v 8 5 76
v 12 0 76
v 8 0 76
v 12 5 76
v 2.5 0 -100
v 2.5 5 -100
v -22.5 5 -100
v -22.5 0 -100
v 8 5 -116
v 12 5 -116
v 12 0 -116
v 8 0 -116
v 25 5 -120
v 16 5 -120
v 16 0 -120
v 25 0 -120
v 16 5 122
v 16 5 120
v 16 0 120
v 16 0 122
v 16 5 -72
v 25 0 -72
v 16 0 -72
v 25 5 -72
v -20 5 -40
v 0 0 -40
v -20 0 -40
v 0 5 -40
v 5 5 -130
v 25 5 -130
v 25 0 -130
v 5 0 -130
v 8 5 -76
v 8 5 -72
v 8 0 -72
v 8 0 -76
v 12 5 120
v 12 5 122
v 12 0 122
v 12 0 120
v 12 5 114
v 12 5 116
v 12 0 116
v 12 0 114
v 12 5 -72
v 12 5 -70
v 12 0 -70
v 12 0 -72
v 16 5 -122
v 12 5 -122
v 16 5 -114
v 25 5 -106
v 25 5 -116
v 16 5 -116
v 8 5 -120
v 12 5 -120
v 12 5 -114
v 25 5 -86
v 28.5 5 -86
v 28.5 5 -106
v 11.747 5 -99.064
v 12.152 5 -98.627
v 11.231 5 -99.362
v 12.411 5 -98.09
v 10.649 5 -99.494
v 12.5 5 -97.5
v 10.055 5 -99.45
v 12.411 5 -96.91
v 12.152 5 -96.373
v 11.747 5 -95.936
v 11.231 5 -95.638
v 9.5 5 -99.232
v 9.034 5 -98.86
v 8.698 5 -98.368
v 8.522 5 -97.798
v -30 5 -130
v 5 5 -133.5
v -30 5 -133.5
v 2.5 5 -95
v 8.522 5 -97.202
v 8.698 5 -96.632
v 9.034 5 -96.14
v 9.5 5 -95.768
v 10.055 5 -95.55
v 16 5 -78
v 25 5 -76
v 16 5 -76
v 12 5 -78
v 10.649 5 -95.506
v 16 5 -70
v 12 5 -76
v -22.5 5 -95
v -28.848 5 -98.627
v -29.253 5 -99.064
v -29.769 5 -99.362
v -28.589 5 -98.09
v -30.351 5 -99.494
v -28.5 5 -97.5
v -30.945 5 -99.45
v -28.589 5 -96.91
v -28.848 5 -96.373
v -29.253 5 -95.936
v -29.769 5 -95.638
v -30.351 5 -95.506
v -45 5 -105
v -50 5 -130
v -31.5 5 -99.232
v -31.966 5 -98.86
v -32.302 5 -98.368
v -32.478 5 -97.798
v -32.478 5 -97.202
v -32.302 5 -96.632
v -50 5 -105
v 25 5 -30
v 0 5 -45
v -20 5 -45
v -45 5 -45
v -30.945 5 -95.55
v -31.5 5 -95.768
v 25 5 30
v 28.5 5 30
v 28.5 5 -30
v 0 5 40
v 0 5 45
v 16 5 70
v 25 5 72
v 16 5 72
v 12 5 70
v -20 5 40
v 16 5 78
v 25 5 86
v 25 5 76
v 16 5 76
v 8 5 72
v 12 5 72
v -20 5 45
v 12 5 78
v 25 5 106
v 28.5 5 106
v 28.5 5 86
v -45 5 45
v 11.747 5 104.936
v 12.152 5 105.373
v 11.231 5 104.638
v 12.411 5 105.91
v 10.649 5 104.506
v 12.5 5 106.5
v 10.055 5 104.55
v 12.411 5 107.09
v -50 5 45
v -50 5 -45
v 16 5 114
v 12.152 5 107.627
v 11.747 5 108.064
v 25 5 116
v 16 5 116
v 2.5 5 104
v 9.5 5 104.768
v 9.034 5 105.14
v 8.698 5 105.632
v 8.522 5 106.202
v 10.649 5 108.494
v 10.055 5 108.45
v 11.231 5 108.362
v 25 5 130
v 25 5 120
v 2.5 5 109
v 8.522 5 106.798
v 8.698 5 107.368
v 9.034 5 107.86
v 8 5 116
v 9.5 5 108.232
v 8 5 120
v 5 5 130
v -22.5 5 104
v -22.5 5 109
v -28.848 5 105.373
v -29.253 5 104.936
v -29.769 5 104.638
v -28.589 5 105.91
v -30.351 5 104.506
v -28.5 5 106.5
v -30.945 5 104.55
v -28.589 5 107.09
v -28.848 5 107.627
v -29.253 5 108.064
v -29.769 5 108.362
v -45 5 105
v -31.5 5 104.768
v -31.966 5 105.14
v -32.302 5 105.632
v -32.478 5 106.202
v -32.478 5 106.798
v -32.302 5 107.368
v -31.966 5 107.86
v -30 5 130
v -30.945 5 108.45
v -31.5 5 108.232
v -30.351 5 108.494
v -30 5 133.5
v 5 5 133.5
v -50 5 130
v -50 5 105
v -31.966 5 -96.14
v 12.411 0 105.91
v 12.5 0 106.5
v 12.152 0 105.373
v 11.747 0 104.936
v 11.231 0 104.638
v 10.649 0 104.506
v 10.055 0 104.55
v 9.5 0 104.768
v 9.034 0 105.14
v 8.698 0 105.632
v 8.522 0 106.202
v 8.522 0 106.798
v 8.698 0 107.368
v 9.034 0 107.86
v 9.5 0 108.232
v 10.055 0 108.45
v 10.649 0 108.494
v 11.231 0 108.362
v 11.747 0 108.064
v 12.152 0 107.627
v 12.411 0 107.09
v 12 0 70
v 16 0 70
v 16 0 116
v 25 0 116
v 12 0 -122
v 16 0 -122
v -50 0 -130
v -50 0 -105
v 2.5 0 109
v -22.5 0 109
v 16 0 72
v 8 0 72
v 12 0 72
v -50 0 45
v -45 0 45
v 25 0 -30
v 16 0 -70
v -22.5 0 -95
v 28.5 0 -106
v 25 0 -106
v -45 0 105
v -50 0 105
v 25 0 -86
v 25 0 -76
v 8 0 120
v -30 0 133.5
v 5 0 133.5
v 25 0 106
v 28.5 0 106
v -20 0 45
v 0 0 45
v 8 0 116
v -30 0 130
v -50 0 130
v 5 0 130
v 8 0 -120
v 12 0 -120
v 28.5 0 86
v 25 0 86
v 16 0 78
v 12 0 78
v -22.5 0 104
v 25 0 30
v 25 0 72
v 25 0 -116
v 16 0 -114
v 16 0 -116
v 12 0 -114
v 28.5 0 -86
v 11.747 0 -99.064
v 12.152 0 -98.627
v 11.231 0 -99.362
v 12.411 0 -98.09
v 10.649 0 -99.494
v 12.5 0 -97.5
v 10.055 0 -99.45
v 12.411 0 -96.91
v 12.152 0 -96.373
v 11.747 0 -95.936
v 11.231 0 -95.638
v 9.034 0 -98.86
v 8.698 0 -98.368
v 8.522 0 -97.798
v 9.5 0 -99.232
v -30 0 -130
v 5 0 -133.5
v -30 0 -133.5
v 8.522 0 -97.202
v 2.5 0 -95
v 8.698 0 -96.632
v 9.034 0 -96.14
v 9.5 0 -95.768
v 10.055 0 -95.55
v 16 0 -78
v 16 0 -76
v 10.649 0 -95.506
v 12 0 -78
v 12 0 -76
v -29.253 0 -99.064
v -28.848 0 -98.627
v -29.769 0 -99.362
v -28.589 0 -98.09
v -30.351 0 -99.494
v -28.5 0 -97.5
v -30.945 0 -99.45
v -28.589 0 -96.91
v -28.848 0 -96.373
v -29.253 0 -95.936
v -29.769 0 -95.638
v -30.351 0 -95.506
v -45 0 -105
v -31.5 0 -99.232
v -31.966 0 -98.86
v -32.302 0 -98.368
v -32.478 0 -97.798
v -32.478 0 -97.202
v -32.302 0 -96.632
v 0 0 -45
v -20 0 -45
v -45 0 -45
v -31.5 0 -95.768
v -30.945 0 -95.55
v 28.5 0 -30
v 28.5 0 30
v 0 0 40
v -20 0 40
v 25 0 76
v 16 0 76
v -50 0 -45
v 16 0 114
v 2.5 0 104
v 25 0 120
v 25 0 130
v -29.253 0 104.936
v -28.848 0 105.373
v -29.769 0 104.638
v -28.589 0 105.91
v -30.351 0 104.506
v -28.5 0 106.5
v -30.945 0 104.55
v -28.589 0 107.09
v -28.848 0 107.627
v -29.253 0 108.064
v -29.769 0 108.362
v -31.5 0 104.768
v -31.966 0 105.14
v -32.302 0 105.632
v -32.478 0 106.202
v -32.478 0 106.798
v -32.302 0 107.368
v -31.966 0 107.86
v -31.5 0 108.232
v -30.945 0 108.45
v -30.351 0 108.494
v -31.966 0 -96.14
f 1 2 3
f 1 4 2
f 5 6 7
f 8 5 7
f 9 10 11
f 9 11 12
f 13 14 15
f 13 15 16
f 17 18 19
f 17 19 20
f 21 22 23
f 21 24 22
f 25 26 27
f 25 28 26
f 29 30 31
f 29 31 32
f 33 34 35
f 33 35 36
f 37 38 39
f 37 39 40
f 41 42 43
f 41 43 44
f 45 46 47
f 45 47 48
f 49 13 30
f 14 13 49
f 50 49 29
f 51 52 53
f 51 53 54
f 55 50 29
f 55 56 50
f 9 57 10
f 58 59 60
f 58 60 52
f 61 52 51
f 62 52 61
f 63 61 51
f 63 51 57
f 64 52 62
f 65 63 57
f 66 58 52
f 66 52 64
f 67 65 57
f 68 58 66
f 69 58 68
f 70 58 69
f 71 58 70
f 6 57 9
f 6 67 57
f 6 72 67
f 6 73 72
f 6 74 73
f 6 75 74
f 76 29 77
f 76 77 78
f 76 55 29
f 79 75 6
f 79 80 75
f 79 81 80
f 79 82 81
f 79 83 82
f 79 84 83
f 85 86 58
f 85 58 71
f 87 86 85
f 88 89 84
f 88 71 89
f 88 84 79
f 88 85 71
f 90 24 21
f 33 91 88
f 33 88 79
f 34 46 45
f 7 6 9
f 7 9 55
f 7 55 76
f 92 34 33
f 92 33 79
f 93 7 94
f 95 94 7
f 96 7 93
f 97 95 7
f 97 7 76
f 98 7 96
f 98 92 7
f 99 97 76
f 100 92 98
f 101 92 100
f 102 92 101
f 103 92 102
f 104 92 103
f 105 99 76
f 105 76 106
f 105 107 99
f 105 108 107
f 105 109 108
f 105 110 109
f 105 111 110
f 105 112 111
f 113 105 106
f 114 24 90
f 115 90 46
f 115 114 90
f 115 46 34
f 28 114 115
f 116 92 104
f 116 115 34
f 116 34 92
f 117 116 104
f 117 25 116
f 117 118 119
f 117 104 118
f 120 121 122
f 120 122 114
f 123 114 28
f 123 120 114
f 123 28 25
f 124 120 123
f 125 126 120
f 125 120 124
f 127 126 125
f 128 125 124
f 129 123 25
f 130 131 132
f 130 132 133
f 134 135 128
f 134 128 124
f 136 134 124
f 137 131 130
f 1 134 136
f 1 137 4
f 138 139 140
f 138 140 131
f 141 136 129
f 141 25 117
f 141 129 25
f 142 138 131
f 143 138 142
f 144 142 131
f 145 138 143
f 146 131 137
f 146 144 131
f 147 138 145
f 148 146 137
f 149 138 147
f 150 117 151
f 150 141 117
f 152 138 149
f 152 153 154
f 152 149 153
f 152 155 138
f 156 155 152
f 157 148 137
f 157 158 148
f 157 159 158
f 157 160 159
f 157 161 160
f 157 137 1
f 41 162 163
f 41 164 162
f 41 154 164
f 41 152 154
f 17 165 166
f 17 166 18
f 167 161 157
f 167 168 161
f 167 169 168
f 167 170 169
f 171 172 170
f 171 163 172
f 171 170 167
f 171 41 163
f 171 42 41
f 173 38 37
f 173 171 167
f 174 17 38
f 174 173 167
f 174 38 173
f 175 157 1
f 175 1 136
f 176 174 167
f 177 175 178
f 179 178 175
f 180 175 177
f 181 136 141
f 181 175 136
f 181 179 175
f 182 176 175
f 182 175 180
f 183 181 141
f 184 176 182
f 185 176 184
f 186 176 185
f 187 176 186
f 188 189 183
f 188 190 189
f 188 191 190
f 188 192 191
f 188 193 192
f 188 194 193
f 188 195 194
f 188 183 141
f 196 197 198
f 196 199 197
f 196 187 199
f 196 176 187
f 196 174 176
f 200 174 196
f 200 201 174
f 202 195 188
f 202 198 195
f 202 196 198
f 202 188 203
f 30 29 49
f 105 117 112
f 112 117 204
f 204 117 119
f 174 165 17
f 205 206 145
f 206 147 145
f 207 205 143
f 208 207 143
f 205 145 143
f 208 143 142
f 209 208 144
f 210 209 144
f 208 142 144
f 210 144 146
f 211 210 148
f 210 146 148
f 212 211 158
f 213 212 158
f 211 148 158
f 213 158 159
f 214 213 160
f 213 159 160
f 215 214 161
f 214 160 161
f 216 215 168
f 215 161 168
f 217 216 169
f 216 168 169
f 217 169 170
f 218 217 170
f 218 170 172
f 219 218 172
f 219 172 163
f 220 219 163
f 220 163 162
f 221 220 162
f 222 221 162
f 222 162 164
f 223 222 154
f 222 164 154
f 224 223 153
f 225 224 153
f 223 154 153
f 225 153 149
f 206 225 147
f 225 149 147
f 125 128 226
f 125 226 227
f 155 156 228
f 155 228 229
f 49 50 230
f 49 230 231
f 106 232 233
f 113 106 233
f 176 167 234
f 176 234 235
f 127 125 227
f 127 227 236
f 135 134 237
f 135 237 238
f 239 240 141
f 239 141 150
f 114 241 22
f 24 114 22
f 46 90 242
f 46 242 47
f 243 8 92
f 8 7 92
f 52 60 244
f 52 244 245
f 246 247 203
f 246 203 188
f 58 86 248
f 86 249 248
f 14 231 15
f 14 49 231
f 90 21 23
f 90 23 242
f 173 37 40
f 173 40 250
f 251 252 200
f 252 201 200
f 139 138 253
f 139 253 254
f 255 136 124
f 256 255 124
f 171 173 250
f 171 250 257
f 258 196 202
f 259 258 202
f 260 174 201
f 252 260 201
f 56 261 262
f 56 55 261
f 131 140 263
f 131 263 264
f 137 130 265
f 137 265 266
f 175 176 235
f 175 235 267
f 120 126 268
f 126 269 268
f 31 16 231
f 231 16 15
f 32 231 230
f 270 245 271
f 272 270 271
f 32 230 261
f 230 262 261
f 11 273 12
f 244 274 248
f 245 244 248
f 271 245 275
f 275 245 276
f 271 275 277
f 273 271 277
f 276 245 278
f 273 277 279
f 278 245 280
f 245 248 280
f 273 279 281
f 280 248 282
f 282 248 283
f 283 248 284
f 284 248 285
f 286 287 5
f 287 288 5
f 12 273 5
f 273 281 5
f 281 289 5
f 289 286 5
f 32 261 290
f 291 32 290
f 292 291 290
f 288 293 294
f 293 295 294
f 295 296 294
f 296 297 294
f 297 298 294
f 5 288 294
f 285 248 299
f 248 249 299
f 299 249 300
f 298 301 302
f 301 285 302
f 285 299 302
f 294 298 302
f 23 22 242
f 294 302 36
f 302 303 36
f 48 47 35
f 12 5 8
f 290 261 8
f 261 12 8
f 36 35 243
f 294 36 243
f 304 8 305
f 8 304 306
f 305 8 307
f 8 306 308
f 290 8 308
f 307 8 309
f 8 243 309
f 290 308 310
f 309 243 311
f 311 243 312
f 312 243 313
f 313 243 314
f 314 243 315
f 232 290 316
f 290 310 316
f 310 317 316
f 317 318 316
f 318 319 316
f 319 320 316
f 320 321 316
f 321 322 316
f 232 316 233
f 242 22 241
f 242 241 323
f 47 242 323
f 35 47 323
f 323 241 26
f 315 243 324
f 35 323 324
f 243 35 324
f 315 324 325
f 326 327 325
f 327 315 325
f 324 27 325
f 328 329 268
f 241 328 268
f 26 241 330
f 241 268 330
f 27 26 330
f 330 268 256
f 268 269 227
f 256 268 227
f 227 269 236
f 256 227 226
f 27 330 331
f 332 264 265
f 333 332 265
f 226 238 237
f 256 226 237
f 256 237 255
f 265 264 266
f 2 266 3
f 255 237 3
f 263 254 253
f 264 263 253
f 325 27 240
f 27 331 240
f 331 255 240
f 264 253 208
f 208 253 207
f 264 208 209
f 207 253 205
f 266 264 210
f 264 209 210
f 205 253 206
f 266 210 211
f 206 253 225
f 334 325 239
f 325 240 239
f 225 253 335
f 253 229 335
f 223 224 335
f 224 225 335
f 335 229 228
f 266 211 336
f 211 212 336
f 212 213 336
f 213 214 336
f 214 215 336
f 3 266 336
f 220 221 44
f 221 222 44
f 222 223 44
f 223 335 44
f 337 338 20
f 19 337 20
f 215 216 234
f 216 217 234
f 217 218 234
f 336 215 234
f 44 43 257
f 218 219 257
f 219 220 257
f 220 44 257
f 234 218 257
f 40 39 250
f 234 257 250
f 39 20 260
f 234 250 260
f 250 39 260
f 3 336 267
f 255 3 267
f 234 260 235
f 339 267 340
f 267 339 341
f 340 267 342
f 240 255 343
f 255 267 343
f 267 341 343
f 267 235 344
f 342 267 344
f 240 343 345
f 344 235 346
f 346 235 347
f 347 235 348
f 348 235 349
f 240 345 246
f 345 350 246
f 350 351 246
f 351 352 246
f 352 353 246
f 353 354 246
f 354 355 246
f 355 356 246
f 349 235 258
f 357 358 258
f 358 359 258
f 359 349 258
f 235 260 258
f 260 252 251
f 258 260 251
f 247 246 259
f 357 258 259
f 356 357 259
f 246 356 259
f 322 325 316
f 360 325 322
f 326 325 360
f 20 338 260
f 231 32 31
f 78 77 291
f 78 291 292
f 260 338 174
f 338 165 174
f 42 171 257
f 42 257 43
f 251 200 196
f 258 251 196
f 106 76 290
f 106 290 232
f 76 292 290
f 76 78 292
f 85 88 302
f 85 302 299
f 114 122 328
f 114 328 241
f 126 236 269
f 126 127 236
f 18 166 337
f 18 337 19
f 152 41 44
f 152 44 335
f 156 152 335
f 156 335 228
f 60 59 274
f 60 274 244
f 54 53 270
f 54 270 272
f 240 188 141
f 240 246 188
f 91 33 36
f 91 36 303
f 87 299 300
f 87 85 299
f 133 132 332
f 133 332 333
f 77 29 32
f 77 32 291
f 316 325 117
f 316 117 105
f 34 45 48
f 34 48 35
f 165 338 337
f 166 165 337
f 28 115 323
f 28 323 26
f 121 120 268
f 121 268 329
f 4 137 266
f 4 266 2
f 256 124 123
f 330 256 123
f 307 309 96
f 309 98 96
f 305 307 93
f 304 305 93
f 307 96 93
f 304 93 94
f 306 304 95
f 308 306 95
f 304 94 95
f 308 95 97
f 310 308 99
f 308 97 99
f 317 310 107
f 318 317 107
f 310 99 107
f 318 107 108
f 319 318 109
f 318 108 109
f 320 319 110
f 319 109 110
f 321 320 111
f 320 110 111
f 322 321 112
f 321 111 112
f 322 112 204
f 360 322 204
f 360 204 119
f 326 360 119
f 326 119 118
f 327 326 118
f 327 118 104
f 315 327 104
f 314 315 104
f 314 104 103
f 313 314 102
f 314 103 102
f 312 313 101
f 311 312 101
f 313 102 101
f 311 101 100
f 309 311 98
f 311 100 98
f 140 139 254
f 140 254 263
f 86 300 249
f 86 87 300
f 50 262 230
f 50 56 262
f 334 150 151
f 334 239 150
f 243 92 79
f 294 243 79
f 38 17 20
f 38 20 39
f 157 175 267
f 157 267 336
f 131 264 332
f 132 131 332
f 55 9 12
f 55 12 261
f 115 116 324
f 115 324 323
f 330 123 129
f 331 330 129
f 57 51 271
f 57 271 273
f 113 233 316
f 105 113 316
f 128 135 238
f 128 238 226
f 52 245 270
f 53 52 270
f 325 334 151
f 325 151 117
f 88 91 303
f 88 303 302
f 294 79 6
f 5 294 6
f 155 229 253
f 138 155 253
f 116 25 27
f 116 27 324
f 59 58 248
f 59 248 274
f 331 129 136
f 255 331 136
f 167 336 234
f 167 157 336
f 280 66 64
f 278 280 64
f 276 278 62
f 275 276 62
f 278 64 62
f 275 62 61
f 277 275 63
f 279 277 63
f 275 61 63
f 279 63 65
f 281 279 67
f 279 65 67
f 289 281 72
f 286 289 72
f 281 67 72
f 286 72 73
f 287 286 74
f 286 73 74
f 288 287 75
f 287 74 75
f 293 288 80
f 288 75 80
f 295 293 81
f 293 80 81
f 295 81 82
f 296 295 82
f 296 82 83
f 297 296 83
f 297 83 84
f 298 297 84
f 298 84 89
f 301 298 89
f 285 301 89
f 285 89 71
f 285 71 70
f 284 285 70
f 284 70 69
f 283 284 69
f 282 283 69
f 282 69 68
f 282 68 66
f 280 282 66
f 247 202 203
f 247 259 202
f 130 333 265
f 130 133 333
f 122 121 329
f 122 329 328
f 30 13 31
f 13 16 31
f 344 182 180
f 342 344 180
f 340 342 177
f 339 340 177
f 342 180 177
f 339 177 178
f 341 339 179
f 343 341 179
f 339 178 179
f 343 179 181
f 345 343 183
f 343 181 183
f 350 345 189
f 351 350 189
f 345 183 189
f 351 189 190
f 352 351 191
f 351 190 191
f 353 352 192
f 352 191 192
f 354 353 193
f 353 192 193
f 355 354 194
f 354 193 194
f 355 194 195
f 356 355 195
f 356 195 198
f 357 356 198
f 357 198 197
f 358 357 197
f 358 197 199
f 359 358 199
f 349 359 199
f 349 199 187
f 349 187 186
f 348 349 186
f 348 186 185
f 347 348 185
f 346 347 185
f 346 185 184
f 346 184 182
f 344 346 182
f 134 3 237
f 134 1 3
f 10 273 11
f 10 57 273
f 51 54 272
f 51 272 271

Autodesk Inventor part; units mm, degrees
ref_plane "YZ Plane" through (0, 0, 0) normal (1, 0, 0) x (0, 1, 0)
ref_plane "XZ Plane" through (0, 0, 0) normal (0, 1, 0) x (-1, 0, 0)
ref_plane "XY Plane" through (0, 0, 0) normal (0, 0, 1) x (1, 0, 0)
sketch "Sketch1" plane through (0, 0, 0) normal (0, 1, 0) x (-1, 0, 0)
  line L0 (-25, -150) -> (25, -150)
  line L1 (25, 150) -> (-25, 150)
  line L2 (-25, 150) -> (-25, -150)
  line L3 (-25, -150) -> (25, 150) construction
  line L4 (25, -150) -> (-25, 150) construction
  line L5 (25, 150) -> (50, 150)
  line L6 (50, 150) -> (50, 105)
  line L7 (50, 105) -> (45, 105)
  line L8 (25, -150) -> (50, -150)
  line L9 (50, -150) -> (50, -105)
  line L10 (50, -105) -> (45, -105)
  line L11 (50, 105) -> (45, 105) construction
  line L12 (45, 105) -> (45, 45) construction
  line L13 (45, 45) -> (50, 45) construction
  line L14 (50, 45) -> (50, 105) construction
  line L15 (50, -105) -> (45, -105) construction
  line L16 (45, -105) -> (45, -45) construction
  line L17 (45, -45) -> (50, -45) construction
  line L18 (50, -45) -> (50, -105) construction
  line L19 (45, 45) -> (50, 45)
  line L20 (50, 45) -> (50, -45)
  line L21 (50, -45) -> (45, -45)
  line L22 (45, 105) -> (45, 45)
  line L23 (45, -45) -> (45, -105)
  point P0 (0, 0)
  dimension "d1" = 300
  dimension "d8" = 5
  dimension "d10" = 5
  dimension "d11" = 45
  dimension "d13" = 60
  dimension "d14" = 75
  dimension "d15" = 75
  dimension "d29" = 90
  dimension "d30" = 45
  dimension "d31" = 60
extrude "Extrusion1" add sketch "Sketch1" along normal blind 5
sketch "Sketch2" plane through (0, 5, 0) normal (0, 1, 0) x (1, 0, 0)
  line L0 (25, 150) -> (-50, 150) construction
  line L1 (-50, 150) -> (-50, 105) construction
  line L2 (-50, 105) -> (-45, 105) construction
  line L3 (-45, 105) -> (-45, 45) construction
  line L4 (-45, 45) -> (-50, 45) construction
  line L5 (-50, 45) -> (-50, -45) construction
  line L6 (-50, -45) -> (-45, -45) construction
  line L7 (-45, -45) -> (-45, -105) construction
  line L8 (-45, -105) -> (-50, -105) construction
  line L9 (-50, -105) -> (-50, -150) construction
  line L10 (-50, -150) -> (25, -150) construction
  line L11 (25, -150) -> (25, 150) construction
  line L12 (-50, -150) -> (25, -150)
  line L13 (25, -150) -> (25, -130)
  line L14 (25, -130) -> (-50, -130)
  line L15 (-50, -130) -> (-50, -150)
  line L16 (25, -150) -> (25, 150) projected
  line L17 (-50, 150) -> (25, 150)
  line L18 (25, 150) -> (25, 130)
  line L19 (25, 130) -> (-50, 130)
  line L20 (-50, 130) -> (-50, 150)
  point P0 (0, 0)
  dimension "d16" = 20
  dimension "d17" = 20
extrude "Extrusion2" cut sketch "Sketch2" against normal blind 5
sketch "Sketch3" plane through (0, 5, 0) normal (0, 1, 0) x (1, 0, 0)
  line L0 (-50, -130) -> (25, -130) construction
  line L1 (25, -130) -> (25, 130) construction
  line L2 (25, 130) -> (-50, 130) construction
  line L3 (-50, 130) -> (-50, 105) construction
  line L4 (-50, 105) -> (-45, 105) construction
  line L5 (-45, 105) -> (-45, 45) construction
  line L6 (-45, 45) -> (-50, 45) construction
  line L7 (-50, 45) -> (-50, -45) construction
  line L8 (-50, -45) -> (-45, -45) construction
  line L9 (-45, -45) -> (-45, -105) construction
  line L10 (-45, -105) -> (-50, -105) construction
  line L11 (-50, -105) -> (-50, -130) construction
  line L12 (2.5, 100) -> (-22.5, 100)
  line L13 (-22.5, 100) -> (-22.5, 95)
  line L14 (-22.5, 95) -> (2.5, 95)
  line L15 (2.5, 95) -> (2.5, 100)
  line L16 (2.5, -109) -> (-22.5, -109)
  line L17 (-22.5, -109) -> (-22.5, -104)
  line L18 (-22.5, -104) -> (2.5, -104)
  line L19 (2.5, -104) -> (2.5, -109)
  point P0 (0, 0)
  dimension "d20" = 25
  dimension "d21" = 5
  dimension "d22" = 22.5
  dimension "d23" = 35
  dimension "d26" = 5
  dimension "d27" = 25
  dimension "d28" = 26
  dimension "d32" = 22.5
extrude "Extrusion3" cut sketch "Sketch3" against normal blind 5
sketch "Sketch4" plane through (0, 5, 0) normal (0, 1, 0) x (1, 0, 0)
  line L0 (-22.5, 95) -> (-22.5, 100) construction
  line L1 (-22.5, 100) -> (2.5, 100) construction
  line L2 (2.5, 100) -> (2.5, 95) construction
  line L3 (2.5, 95) -> (-22.5, 95) construction
  line L4 (2.5, -109) -> (-22.5, -109) construction
  line L5 (-22.5, -109) -> (-22.5, -104) construction
  line L6 (-22.5, -104) -> (2.5, -104) construction
  line L7 (2.5, -104) -> (2.5, -109) construction
  line L8 (-50, -130) -> (25, -130) construction
  line L9 (25, -130) -> (25, 130) construction
  line L10 (25, 130) -> (-50, 130) construction
  line L11 (-50, 130) -> (-50, 105) construction
  line L12 (-50, 105) -> (-45, 105) construction
  line L13 (-45, 105) -> (-45, 45) construction
  line L14 (-45, 45) -> (-50, 45) construction
  line L15 (-50, 45) -> (-50, -45) construction
  line L16 (-50, -45) -> (-45, -45) construction
  line L17 (-45, -45) -> (-45, -105) construction
  line L18 (-45, -105) -> (-50, -105) construction
  line L19 (-50, -105) -> (-50, -130) construction
  line L20 (2.5, 97.5) -> (25, 97.5) construction
  line L21 (-22.5, 97.5) -> (-45, 97.5) construction
  line L22 (-22.5, -104) -> (-22.5, -109) construction
  line L23 (-22.5, -106.5) -> (-50, -106.5) construction
  line L24 (2.5, -109) -> (2.5, -104) construction
  line L25 (2.5, -106.5) -> (25, -106.5) construction
  circle A0 centre (-30.5, -106.5) radius 2
  circle A1 centre (10.5, -106.5) radius 2
  circle A2 centre (-30.5, 97.5) radius 2
  circle A3 centre (10.5, 97.5) radius 2
  point P0 (0, 0)
  dimension "d33" = 4
  dimension "d34" = 4
  dimension "d35" = 4
  dimension "d36" = 4
  dimension "d37" = 8
  dimension "d38" = 8
  dimension "d39" = 8
  dimension "d40" = 8
extrude "Extrusion4" cut sketch "Sketch4" against normal blind 5
sketch "Sketch5" plane through (0, 5, 0) normal (0, 1, 0) x (1, 0, 0)
  circle A0 centre (-30.5, 97.5) radius 2 construction
  circle A1 centre (-30.5, -106.5) radius 2 construction
  circle A2 centre (10.5, -106.5) radius 2 construction
  circle A3 centre (10.5, 97.5) radius 2 construction
  line L0 (-22.5, 95) -> (-22.5, 100) construction
  line L1 (-22.5, 100) -> (2.5, 100) construction
  line L2 (2.5, 100) -> (2.5, 95) construction
  line L3 (2.5, 95) -> (-22.5, 95) construction
  line L4 (2.5, -109) -> (-22.5, -109) construction
  line L5 (-22.5, -109) -> (-22.5, -104) construction
  line L6 (-22.5, -104) -> (2.5, -104) construction
  line L7 (2.5, -104) -> (2.5, -109) construction
  line L8 (-50, -130) -> (25, -130) construction
  line L9 (25, -130) -> (25, 130) construction
  line L10 (25, 130) -> (-50, 130) construction
  line L11 (-50, 130) -> (-50, 105) construction
  line L12 (-50, 105) -> (-45, 105) construction
  line L13 (-45, 105) -> (-45, 45) construction
  line L14 (-45, 45) -> (-50, 45) construction
  line L15 (-50, 45) -> (-50, -45) construction
  line L16 (-50, -45) -> (-45, -45) construction
  line L17 (-45, -45) -> (-45, -105) construction
  line L18 (-45, -105) -> (-50, -105) construction
  line L19 (-50, -105) -> (-50, -130) construction
  line L20 (-45, 45) -> (25, 45) construction
  line L21 (-45, -45) -> (25, -45) construction
  line L22 (-20, -45) -> (0, -45)
  line L23 (0, -45) -> (0, -40)
  line L24 (0, -40) -> (-20, -40)
  line L25 (-20, -40) -> (-20, -45)
  line L26 (-50, 0) -> (25, 0) construction
  line L27 (-20, 45) -> (0, 45)
  line L28 (0, 45) -> (0, 40)
  line L29 (0, 40) -> (-20, 40)
  line L30 (-20, 40) -> (-20, 45)
  point P0 (0, 0)
  dimension "d43" = 20
  dimension "d44" = 5
  dimension "d45" = 25
extrude "Extrusion5" cut sketch "Sketch5" against normal blind 10
sketch "Sketch6" plane through (0, 5, 0) normal (0, 1, 0) x (1, 0, 0)
  line L0 (0, -40) -> (0, -45) construction
  line L1 (0, -45) -> (-20, -45) construction
  line L2 (-20, -45) -> (-20, -40) construction
  line L3 (-20, -40) -> (0, -40) construction
  line L4 (0, 45) -> (0, 40) construction
  line L5 (0, 40) -> (-20, 40) construction
  line L6 (-20, 40) -> (-20, 45) construction
  line L7 (-20, 45) -> (0, 45) construction
  circle A0 centre (-30.5, 97.5) radius 2 construction
  circle A1 centre (-30.5, -106.5) radius 2 construction
  circle A2 centre (10.5, -106.5) radius 2 construction
  circle A3 centre (10.5, 97.5) radius 2 construction
  line L8 (-22.5, 95) -> (-22.5, 100) construction
  line L9 (-22.5, 100) -> (2.5, 100) construction
  line L10 (2.5, 100) -> (2.5, 95) construction
  line L11 (2.5, 95) -> (-22.5, 95) construction
  line L12 (2.5, -109) -> (-22.5, -109) construction
  line L13 (-22.5, -109) -> (-22.5, -104) construction
  line L14 (-22.5, -104) -> (2.5, -104) construction
  line L15 (2.5, -104) -> (2.5, -109) construction
  line L16 (-50, -130) -> (25, -130) construction
  line L17 (25, -130) -> (25, 130) construction
  line L18 (25, 130) -> (-50, 130) construction
  line L19 (-50, 130) -> (-50, 105) construction
  line L20 (-50, 105) -> (-45, 105) construction
  line L21 (-45, 105) -> (-45, 45) construction
  line L22 (-45, 45) -> (-50, 45) construction
  line L23 (-50, 45) -> (-50, -45) construction
  line L24 (-50, -45) -> (-45, -45) construction
  line L25 (-45, -45) -> (-45, -105) construction
  line L26 (-45, -105) -> (-50, -105) construction
  line L27 (-50, -105) -> (-50, -130) construction
  line L28 (25, -130) -> (25, 130) construction
  line L29 (25, -120) -> (10, -120) construction
  line L30 (10, -120) -> (10, -116) construction
  line L31 (10, -116) -> (25, -116) construction
  line L32 (25, -116) -> (25, -120) construction
  line L33 (10, -118) -> (25, -118) construction
  line L34 (18, -114) -> (14, -114) construction
  line L35 (14, -114) -> (14, -122) construction
  line L36 (14, -122) -> (18, -122) construction
  line L37 (18, -122) -> (18, -114) construction
  line L38 (18, -114) -> (14, -122) construction
  line L39 (14, -114) -> (18, -122) construction
  line L40 (25, -116) -> (25, -120)
  line L41 (25, -120) -> (18, -120)
  line L42 (18, -120) -> (18, -122)
  line L43 (18, -122) -> (14, -122)
  line L44 (14, -122) -> (14, -120)
  line L45 (14, -120) -> (10, -120)
  line L46 (10, -120) -> (10, -116)
  line L47 (10, -116) -> (14, -116)
  line L48 (14, -116) -> (14, -114)
  line L49 (14, -114) -> (18, -114)
  line L50 (18, -114) -> (18, -116)
  line L51 (18, -116) -> (25, -116)
  line L52 (25, -76) -> (10, -76) construction
  line L53 (10, -76) -> (10, -72) construction
  line L54 (10, -72) -> (25, -72) construction
  line L55 (25, -72) -> (25, -76) construction
  line L56 (10, -74) -> (25, -74) construction
  line L57 (18, -70) -> (14, -70) construction
  line L58 (14, -70) -> (14, -78) construction
  line L59 (14, -78) -> (18, -78) construction
  line L60 (18, -78) -> (18, -70) construction
  line L61 (18, -70) -> (14, -78) construction
  line L62 (14, -70) -> (18, -78) construction
  line L63 (25, -72) -> (25, -76)
  line L64 (25, -76) -> (18, -76)
  line L65 (18, -76) -> (18, -78)
  line L66 (18, -78) -> (14, -78)
  line L67 (14, -78) -> (14, -76)
  line L68 (14, -76) -> (10, -76)
  line L69 (10, -76) -> (10, -72)
  line L70 (10, -72) -> (14, -72)
  line L71 (14, -72) -> (14, -70)
  line L72 (14, -70) -> (18, -70)
  line L73 (18, -70) -> (18, -72)
  line L74 (18, -72) -> (25, -72)
  line L75 (25, -106) -> (28.5, -106)
  line L76 (28.5, -106) -> (28.5, -86)
  line L77 (28.5, -86) -> (25, -86)
  line L78 (25, -86) -> (25, -106)
  line L79 (25, 72) -> (10, 72) construction
  line L80 (10, 72) -> (10, 76) construction
  line L81 (10, 76) -> (25, 76) construction
  line L82 (25, 76) -> (25, 72) construction
  line L83 (10, 74) -> (25, 74) construction
  line L84 (18, 78) -> (14, 78) construction
  line L85 (14, 78) -> (14, 70) construction
  line L86 (14, 70) -> (18, 70) construction
  line L87 (18, 70) -> (18, 78) construction
  line L88 (18, 78) -> (14, 70) construction
  line L89 (14, 78) -> (18, 70) construction
  line L90 (25, 76) -> (25, 72)
  line L91 (25, 72) -> (18, 72)
  line L92 (18, 72) -> (18, 70)
  line L93 (18, 70) -> (14, 70)
  line L94 (14, 70) -> (14, 72)
  line L95 (14, 72) -> (10, 72)
  line L96 (10, 72) -> (10, 76)
  line L97 (10, 76) -> (14, 76)
  line L98 (14, 76) -> (14, 78)
  line L99 (14, 78) -> (18, 78)
  line L100 (18, 78) -> (18, 76)
  line L101 (18, 76) -> (25, 76)
  line L102 (18, 122) -> (14, 122) construction
  line L103 (14, 122) -> (18, 122)
  line L104 (18, 122) -> (18, 120)
  line L105 (10, 120) -> (25, 120) construction
  line L106 (10, 118) -> (25, 118) construction
  line L107 (25, 116) -> (10, 116) construction
  line L108 (18, 114) -> (18, 122) construction
  line L109 (18, 122) -> (14, 114) construction
  line L110 (14, 122) -> (18, 114) construction
  line L111 (14, 122) -> (14, 114) construction
  line L112 (14, 114) -> (18, 114) construction
  line L113 (18, 114) -> (14, 114)
  line L114 (18, 116) -> (18, 114)
  line L115 (25, 116) -> (18, 116)
  line L116 (25, 120) -> (25, 116) construction
  line L117 (25, 120) -> (25, 116)
  line L118 (18, 120) -> (25, 120)
  line L119 (10, 116) -> (10, 120) construction
  line L120 (14, 114) -> (14, 116)
  line L121 (14, 120) -> (14, 122)
  line L122 (10, 120) -> (14, 120)
  line L123 (14, 116) -> (10, 116)
  line L124 (10, 116) -> (10, 120)
  line L125 (25, 86) -> (28.5, 86)
  line L126 (28.5, 86) -> (28.5, 106)
  line L127 (28.5, 106) -> (25, 106)
  line L128 (25, 106) -> (25, 86)
  line L129 (25, -30) -> (28.5, -30)
  line L130 (28.5, -30) -> (28.5, 30)
  line L131 (28.5, 30) -> (25, 30)
  line L132 (25, 30) -> (25, -30)
  line L133 (25, -130) -> (25, 130) projected
  point P0 (0, 0)
  point P1 (16, -118)
  point P2 (16, -74)
  point P3 (16, 74)
  point P4 (16, 118)
  dimension "d48" = 15
  dimension "d49" = 4
  dimension "d50" = 4
  dimension "d51" = 8
  dimension "d52" = 4
  dimension "d53" = 10
  dimension "d54" = 15
  dimension "d55" = 4
  dimension "d56" = 4
  dimension "d57" = 8
  dimension "d58" = 4
  dimension "d60" = 40
  dimension "d61" = 3.5
  dimension "d62" = 20
  dimension "d63" = 10
  dimension "d64" = 15
  dimension "d65" = 4
  dimension "d66" = 4
  dimension "d67" = 8
  dimension "d68" = 4
  dimension "d69" = 15
  dimension "d70" = 4
  dimension "d71" = 4
  dimension "d72" = 8
  dimension "d73" = 4
  dimension "d74" = 40
  dimension "d75" = 3.5
  dimension "d76" = 20
  dimension "d77" = 10
  dimension "d78" = 10
  dimension "d79" = 3.5
  dimension "d80" = 60
  dimension "d81" = 30
extrude "Extrusion6" add sketch "Sketch6" against normal blind 5 contours L128 L127 L126 L125 | L132 L131 L130 L129 | L78 L77 L76 L75
sketch "Sketch8" plane through (0, 5, 0) normal (0, 1, 0) x (1, 0, 0)
  line L0 (0, -40) -> (0, -45) construction
  line L1 (0, -45) -> (-20, -45) construction
  line L2 (-20, -45) -> (-20, -40) construction
  line L3 (-20, -40) -> (0, -40) construction
  line L4 (0, 45) -> (0, 40) construction
  line L5 (0, 40) -> (-20, 40) construction
  line L6 (-20, 40) -> (-20, 45) construction
  line L7 (-20, 45) -> (0, 45) construction
  circle A0 centre (-30.5, 97.5) radius 2 construction
  circle A1 centre (-30.5, -106.5) radius 2 construction
  circle A2 centre (10.5, -106.5) radius 2 construction
  circle A3 centre (10.5, 97.5) radius 2 construction
  line L8 (-22.5, 95) -> (-22.5, 100) construction
  line L9 (-22.5, 100) -> (2.5, 100) construction
  line L10 (2.5, 100) -> (2.5, 95) construction
  line L11 (2.5, 95) -> (-22.5, 95) construction
  line L12 (2.5, -109) -> (-22.5, -109) construction
  line L13 (-22.5, -109) -> (-22.5, -104) construction
  line L14 (-22.5, -104) -> (2.5, -104) construction
  line L15 (2.5, -104) -> (2.5, -109) construction
  line L16 (-50, -130) -> (25, -130) construction
  line L17 (25, -130) -> (25, -106) construction
  line L18 (25, -106) -> (28.5, -106) construction
  line L19 (28.5, -106) -> (28.5, -86) construction
  line L20 (28.5, -86) -> (25, -86) construction
  line L21 (25, -86) -> (25, -30) construction
  line L22 (25, -30) -> (28.5, -30) construction
  line L23 (28.5, -30) -> (28.5, 30) construction
  line L24 (28.5, 30) -> (25, 30) construction
  line L25 (25, 30) -> (25, 86) construction
  line L26 (28.5, 86) -> (25, 86) construction
  line L27 (28.5, 106) -> (28.5, 86) construction
  line L28 (25, 106) -> (28.5, 106) construction
  line L29 (25, 106) -> (25, 130) construction
  line L30 (25, 130) -> (-50, 130) construction
  line L31 (-50, 130) -> (-50, 105) construction
  line L32 (-50, 105) -> (-45, 105) construction
  line L33 (-45, 105) -> (-45, 45) construction
  line L34 (-45, 45) -> (-50, 45) construction
  line L35 (-50, 45) -> (-50, -45) construction
  line L36 (-50, -45) -> (-45, -45) construction
  line L37 (-45, -45) -> (-45, -105) construction
  line L38 (-45, -105) -> (-50, -105) construction
  line L39 (-50, -105) -> (-50, -130) construction
  line L40 (25, -130) -> (25, -106) construction
  line L41 (25, -120) -> (8, -120) construction
  line L42 (8, -120) -> (8, -116) construction
  line L43 (8, -116) -> (25, -116) construction
  line L44 (25, -116) -> (25, -120) construction
  line L45 (8, -118) -> (25, -118) construction
  line L46 (16, -122) -> (12, -122) construction
  line L47 (12, -122) -> (12, -114) construction
  line L48 (12, -114) -> (16, -114) construction
  line L49 (16, -114) -> (16, -122) construction
  line L50 (16, -122) -> (12, -114) construction
  line L51 (12, -122) -> (16, -114) construction
  line L52 (25, -120) -> (16, -120)
  line L53 (16, -120) -> (16, -122)
  line L54 (16, -122) -> (12, -122)
  line L55 (12, -122) -> (12, -120)
  line L56 (12, -120) -> (8, -120)
  line L57 (8, -120) -> (8, -116)
  line L58 (8, -116) -> (12, -116)
  line L59 (12, -116) -> (12, -114)
  line L60 (12, -114) -> (16, -114)
  line L61 (16, -114) -> (16, -116)
  line L62 (16, -116) -> (25, -116)
  line L63 (25, -120) -> (25, -116)
  line L64 (25, -76) -> (8, -76) construction
  line L65 (8, -76) -> (8, -72) construction
  line L66 (8, -72) -> (25, -72) construction
  line L67 (25, -72) -> (25, -76) construction
  line L68 (8, -74) -> (25, -74) construction
  line L69 (16, -78) -> (12, -78) construction
  line L70 (12, -78) -> (12, -70) construction
  line L71 (12, -70) -> (16, -70) construction
  line L72 (16, -70) -> (16, -78) construction
  line L73 (16, -78) -> (12, -70) construction
  line L74 (12, -78) -> (16, -70) construction
  line L75 (25, -76) -> (16, -76)
  line L76 (16, -76) -> (16, -78)
  line L77 (16, -78) -> (12, -78)
  line L78 (12, -78) -> (12, -76)
  line L79 (12, -76) -> (8, -76)
  line L80 (8, -76) -> (8, -72)
  line L81 (8, -72) -> (12, -72)
  line L82 (12, -72) -> (12, -70)
  line L83 (12, -70) -> (16, -70)
  line L84 (16, -70) -> (16, -72)
  line L85 (16, -72) -> (25, -72)
  line L86 (25, -76) -> (25, -72)
  line L87 (25, 72) -> (8, 72) construction
  line L88 (8, 72) -> (8, 76) construction
  line L89 (8, 76) -> (25, 76) construction
  line L90 (25, 76) -> (25, 72) construction
  line L91 (8, 74) -> (25, 74) construction
  line L92 (16, 70) -> (12, 70) construction
  line L93 (12, 70) -> (12, 78) construction
  line L94 (12, 78) -> (16, 78) construction
  line L95 (16, 78) -> (16, 70) construction
  line L96 (16, 70) -> (12, 78) construction
  line L97 (12, 70) -> (16, 78) construction
  line L98 (25, 72) -> (16, 72)
  line L99 (16, 72) -> (16, 70)
  line L100 (16, 70) -> (12, 70)
  line L101 (12, 70) -> (12, 72)
  line L102 (12, 72) -> (8, 72)
  line L103 (8, 72) -> (8, 76)
  line L104 (8, 76) -> (12, 76)
  line L105 (12, 76) -> (12, 78)
  line L106 (12, 78) -> (16, 78)
  line L107 (16, 78) -> (16, 76)
  line L108 (16, 76) -> (25, 76)
  line L109 (25, 72) -> (25, 76)
  line L110 (25, 116) -> (8, 116) construction
  line L111 (8, 116) -> (8, 120) construction
  line L112 (8, 120) -> (25, 120) construction
  line L113 (25, 120) -> (25, 116) construction
  line L114 (8, 118) -> (25, 118) construction
  line L115 (16, 114) -> (12, 114) construction
  line L116 (12, 114) -> (12, 122) construction
  line L117 (12, 122) -> (16, 122) construction
  line L118 (16, 122) -> (16, 114) construction
  line L119 (16, 114) -> (12, 122) construction
  line L120 (12, 114) -> (16, 122) construction
  line L121 (25, 116) -> (16, 116)
  line L122 (16, 116) -> (16, 114)
  line L123 (16, 114) -> (12, 114)
  line L124 (12, 114) -> (12, 116)
  line L125 (12, 116) -> (8, 116)
  line L126 (8, 116) -> (8, 120)
  line L127 (8, 120) -> (12, 120)
  line L128 (12, 120) -> (12, 122)
  line L129 (12, 122) -> (16, 122)
  line L130 (16, 122) -> (16, 120)
  line L131 (16, 120) -> (25, 120)
  line L132 (25, 116) -> (25, 120)
  point P0 (14, -118)
  point P1 (14, -74)
  point P2 (14, 74)
  point P3 (14, 118)
  dimension "d152" = 17
  dimension "d153" = 4
  dimension "d154" = 4
  dimension "d155" = 8
  dimension "d156" = 10
  dimension "d157" = 17
  dimension "d158" = 4
  dimension "d159" = 4
  dimension "d160" = 8
  dimension "d161" = 17
  dimension "d162" = 4
  dimension "d163" = 4
  dimension "d164" = 8
  dimension "d165" = 17
  dimension "d166" = 4
  dimension "d167" = 4
  dimension "d168" = 8
  dimension "d169" = 10
  dimension "d170" = 10
  dimension "d171" = 10
  dimension "d182" = 4
  dimension "d183" = 0
  dimension "d184" = 4
  dimension "d185" = 0
  dimension "d186" = 4
  dimension "d187" = 0
  dimension "d188" = 4
extrude "Extrusion7" cut sketch "Sketch8" against normal blind 10
sketch "Sketch9" plane through (0, 5, 0) normal (0, 1, 0) x (1, 0, 0)
  line L0 (16, 76) -> (25, 76) construction
  line L1 (25, 76) -> (25, 86) construction
  line L2 (28.5, 86) -> (25, 86) construction
  line L3 (28.5, 106) -> (28.5, 86) construction
  line L4 (25, 106) -> (28.5, 106) construction
  line L5 (25, 106) -> (25, 116) construction
  line L6 (25, 116) -> (16, 116) construction
  line L7 (16, 116) -> (16, 114) construction
  line L8 (16, 114) -> (12, 114) construction
  line L9 (12, 114) -> (12, 116) construction
  line L10 (12, 116) -> (8, 116) construction
  line L11 (8, 116) -> (8, 120) construction
  line L12 (8, 120) -> (12, 120) construction
  line L13 (12, 120) -> (12, 122) construction
  line L14 (12, 122) -> (16, 122) construction
  line L15 (16, 122) -> (16, 120) construction
  line L16 (16, 120) -> (25, 120) construction
  line L17 (25, 120) -> (25, 130) construction
  line L18 (25, 130) -> (-50, 130) construction
  line L19 (-50, 130) -> (-50, 105) construction
  line L20 (-50, 105) -> (-45, 105) construction
  line L21 (-45, 105) -> (-45, 45) construction
  line L22 (-45, 45) -> (-50, 45) construction
  line L23 (-50, 45) -> (-50, -45) construction
  line L24 (-50, -45) -> (-45, -45) construction
  line L25 (-45, -45) -> (-45, -105) construction
  line L26 (-45, -105) -> (-50, -105) construction
  line L27 (-50, -105) -> (-50, -130) construction
  line L28 (-50, -130) -> (25, -130) construction
  line L29 (25, -130) -> (25, -120) construction
  line L30 (25, -120) -> (16, -120) construction
  line L31 (16, -120) -> (16, -122) construction
  line L32 (16, -122) -> (12, -122) construction
  line L33 (12, -122) -> (12, -120) construction
  line L34 (12, -120) -> (8, -120) construction
  line L35 (8, -120) -> (8, -116) construction
  line L36 (8, -116) -> (12, -116) construction
  line L37 (12, -116) -> (12, -114) construction
  line L38 (12, -114) -> (16, -114) construction
  line L39 (16, -114) -> (16, -116) construction
  line L40 (16, -116) -> (25, -116) construction
  line L41 (25, -116) -> (25, -106) construction
  line L42 (25, -106) -> (28.5, -106) construction
  line L43 (28.5, -106) -> (28.5, -86) construction
  line L44 (28.5, -86) -> (25, -86) construction
  line L45 (25, -86) -> (25, -76) construction
  line L46 (25, -76) -> (16, -76) construction
  line L47 (16, -76) -> (16, -78) construction
  line L48 (16, -78) -> (12, -78) construction
  line L49 (12, -78) -> (12, -76) construction
  line L50 (12, -76) -> (8, -76) construction
  line L51 (8, -76) -> (8, -72) construction
  line L52 (8, -72) -> (12, -72) construction
  line L53 (12, -72) -> (12, -70) construction
  line L54 (12, -70) -> (16, -70) construction
  line L55 (16, -70) -> (16, -72) construction
  line L56 (16, -72) -> (25, -72) construction
  line L57 (25, -72) -> (25, -30) construction
  line L58 (25, -30) -> (28.5, -30) construction
  line L59 (28.5, -30) -> (28.5, 30) construction
  line L60 (28.5, 30) -> (25, 30) construction
  line L61 (25, 30) -> (25, 72) construction
  line L62 (25, 72) -> (16, 72) construction
  line L63 (16, 72) -> (16, 70) construction
  line L64 (16, 70) -> (12, 70) construction
  line L65 (12, 70) -> (12, 72) construction
  line L66 (12, 72) -> (8, 72) construction
  line L67 (8, 72) -> (8, 76) construction
  line L68 (8, 76) -> (12, 76) construction
  line L69 (12, 76) -> (12, 78) construction
  line L70 (12, 78) -> (16, 78) construction
  line L71 (16, 78) -> (16, 76) construction
  line L72 (0, -40) -> (0, -45) construction
  line L73 (0, -45) -> (-20, -45) construction
  line L74 (-20, -45) -> (-20, -40) construction
  line L75 (-20, -40) -> (0, -40) construction
  line L76 (0, 45) -> (0, 40) construction
  line L77 (0, 40) -> (-20, 40) construction
  line L78 (-20, 40) -> (-20, 45) construction
  line L79 (-20, 45) -> (0, 45) construction
  circle A0 centre (-30.5, 97.5) radius 2 construction
  circle A1 centre (-30.5, -106.5) radius 2 construction
  circle A2 centre (10.5, -106.5) radius 2 construction
  circle A3 centre (10.5, 97.5) radius 2 construction
  line L80 (-22.5, 95) -> (-22.5, 100) construction
  line L81 (-22.5, 100) -> (2.5, 100) construction
  line L82 (2.5, 100) -> (2.5, 95) construction
  line L83 (2.5, 95) -> (-22.5, 95) construction
  line L84 (2.5, -109) -> (-22.5, -109) construction
  line L85 (-22.5, -109) -> (-22.5, -104) construction
  line L86 (-22.5, -104) -> (2.5, -104) construction
  line L87 (2.5, -104) -> (2.5, -109) construction
  line L88 (-30, -130) -> (5, -130)
  line L89 (5, -130) -> (5, -133.5)
  line L90 (5, -133.5) -> (-30, -133.5)
  line L91 (-30, -133.5) -> (-30, -130)
  line L92 (-30, 130) -> (5, 130)
  line L93 (5, 130) -> (5, 133.5)
  line L94 (5, 133.5) -> (-30, 133.5)
  line L95 (-30, 133.5) -> (-30, 130)
  point P0 (0, 0)
  dimension "d174" = 35
  dimension "d175" = 3.5
  dimension "d176" = 35
  dimension "d177" = 3.5
  dimension "d178" = 20
  dimension "d179" = 20
extrude "Extrusion8" add sketch "Sketch9" against normal blind 5
properties part number "Cubierta_Ducto_Motor"
